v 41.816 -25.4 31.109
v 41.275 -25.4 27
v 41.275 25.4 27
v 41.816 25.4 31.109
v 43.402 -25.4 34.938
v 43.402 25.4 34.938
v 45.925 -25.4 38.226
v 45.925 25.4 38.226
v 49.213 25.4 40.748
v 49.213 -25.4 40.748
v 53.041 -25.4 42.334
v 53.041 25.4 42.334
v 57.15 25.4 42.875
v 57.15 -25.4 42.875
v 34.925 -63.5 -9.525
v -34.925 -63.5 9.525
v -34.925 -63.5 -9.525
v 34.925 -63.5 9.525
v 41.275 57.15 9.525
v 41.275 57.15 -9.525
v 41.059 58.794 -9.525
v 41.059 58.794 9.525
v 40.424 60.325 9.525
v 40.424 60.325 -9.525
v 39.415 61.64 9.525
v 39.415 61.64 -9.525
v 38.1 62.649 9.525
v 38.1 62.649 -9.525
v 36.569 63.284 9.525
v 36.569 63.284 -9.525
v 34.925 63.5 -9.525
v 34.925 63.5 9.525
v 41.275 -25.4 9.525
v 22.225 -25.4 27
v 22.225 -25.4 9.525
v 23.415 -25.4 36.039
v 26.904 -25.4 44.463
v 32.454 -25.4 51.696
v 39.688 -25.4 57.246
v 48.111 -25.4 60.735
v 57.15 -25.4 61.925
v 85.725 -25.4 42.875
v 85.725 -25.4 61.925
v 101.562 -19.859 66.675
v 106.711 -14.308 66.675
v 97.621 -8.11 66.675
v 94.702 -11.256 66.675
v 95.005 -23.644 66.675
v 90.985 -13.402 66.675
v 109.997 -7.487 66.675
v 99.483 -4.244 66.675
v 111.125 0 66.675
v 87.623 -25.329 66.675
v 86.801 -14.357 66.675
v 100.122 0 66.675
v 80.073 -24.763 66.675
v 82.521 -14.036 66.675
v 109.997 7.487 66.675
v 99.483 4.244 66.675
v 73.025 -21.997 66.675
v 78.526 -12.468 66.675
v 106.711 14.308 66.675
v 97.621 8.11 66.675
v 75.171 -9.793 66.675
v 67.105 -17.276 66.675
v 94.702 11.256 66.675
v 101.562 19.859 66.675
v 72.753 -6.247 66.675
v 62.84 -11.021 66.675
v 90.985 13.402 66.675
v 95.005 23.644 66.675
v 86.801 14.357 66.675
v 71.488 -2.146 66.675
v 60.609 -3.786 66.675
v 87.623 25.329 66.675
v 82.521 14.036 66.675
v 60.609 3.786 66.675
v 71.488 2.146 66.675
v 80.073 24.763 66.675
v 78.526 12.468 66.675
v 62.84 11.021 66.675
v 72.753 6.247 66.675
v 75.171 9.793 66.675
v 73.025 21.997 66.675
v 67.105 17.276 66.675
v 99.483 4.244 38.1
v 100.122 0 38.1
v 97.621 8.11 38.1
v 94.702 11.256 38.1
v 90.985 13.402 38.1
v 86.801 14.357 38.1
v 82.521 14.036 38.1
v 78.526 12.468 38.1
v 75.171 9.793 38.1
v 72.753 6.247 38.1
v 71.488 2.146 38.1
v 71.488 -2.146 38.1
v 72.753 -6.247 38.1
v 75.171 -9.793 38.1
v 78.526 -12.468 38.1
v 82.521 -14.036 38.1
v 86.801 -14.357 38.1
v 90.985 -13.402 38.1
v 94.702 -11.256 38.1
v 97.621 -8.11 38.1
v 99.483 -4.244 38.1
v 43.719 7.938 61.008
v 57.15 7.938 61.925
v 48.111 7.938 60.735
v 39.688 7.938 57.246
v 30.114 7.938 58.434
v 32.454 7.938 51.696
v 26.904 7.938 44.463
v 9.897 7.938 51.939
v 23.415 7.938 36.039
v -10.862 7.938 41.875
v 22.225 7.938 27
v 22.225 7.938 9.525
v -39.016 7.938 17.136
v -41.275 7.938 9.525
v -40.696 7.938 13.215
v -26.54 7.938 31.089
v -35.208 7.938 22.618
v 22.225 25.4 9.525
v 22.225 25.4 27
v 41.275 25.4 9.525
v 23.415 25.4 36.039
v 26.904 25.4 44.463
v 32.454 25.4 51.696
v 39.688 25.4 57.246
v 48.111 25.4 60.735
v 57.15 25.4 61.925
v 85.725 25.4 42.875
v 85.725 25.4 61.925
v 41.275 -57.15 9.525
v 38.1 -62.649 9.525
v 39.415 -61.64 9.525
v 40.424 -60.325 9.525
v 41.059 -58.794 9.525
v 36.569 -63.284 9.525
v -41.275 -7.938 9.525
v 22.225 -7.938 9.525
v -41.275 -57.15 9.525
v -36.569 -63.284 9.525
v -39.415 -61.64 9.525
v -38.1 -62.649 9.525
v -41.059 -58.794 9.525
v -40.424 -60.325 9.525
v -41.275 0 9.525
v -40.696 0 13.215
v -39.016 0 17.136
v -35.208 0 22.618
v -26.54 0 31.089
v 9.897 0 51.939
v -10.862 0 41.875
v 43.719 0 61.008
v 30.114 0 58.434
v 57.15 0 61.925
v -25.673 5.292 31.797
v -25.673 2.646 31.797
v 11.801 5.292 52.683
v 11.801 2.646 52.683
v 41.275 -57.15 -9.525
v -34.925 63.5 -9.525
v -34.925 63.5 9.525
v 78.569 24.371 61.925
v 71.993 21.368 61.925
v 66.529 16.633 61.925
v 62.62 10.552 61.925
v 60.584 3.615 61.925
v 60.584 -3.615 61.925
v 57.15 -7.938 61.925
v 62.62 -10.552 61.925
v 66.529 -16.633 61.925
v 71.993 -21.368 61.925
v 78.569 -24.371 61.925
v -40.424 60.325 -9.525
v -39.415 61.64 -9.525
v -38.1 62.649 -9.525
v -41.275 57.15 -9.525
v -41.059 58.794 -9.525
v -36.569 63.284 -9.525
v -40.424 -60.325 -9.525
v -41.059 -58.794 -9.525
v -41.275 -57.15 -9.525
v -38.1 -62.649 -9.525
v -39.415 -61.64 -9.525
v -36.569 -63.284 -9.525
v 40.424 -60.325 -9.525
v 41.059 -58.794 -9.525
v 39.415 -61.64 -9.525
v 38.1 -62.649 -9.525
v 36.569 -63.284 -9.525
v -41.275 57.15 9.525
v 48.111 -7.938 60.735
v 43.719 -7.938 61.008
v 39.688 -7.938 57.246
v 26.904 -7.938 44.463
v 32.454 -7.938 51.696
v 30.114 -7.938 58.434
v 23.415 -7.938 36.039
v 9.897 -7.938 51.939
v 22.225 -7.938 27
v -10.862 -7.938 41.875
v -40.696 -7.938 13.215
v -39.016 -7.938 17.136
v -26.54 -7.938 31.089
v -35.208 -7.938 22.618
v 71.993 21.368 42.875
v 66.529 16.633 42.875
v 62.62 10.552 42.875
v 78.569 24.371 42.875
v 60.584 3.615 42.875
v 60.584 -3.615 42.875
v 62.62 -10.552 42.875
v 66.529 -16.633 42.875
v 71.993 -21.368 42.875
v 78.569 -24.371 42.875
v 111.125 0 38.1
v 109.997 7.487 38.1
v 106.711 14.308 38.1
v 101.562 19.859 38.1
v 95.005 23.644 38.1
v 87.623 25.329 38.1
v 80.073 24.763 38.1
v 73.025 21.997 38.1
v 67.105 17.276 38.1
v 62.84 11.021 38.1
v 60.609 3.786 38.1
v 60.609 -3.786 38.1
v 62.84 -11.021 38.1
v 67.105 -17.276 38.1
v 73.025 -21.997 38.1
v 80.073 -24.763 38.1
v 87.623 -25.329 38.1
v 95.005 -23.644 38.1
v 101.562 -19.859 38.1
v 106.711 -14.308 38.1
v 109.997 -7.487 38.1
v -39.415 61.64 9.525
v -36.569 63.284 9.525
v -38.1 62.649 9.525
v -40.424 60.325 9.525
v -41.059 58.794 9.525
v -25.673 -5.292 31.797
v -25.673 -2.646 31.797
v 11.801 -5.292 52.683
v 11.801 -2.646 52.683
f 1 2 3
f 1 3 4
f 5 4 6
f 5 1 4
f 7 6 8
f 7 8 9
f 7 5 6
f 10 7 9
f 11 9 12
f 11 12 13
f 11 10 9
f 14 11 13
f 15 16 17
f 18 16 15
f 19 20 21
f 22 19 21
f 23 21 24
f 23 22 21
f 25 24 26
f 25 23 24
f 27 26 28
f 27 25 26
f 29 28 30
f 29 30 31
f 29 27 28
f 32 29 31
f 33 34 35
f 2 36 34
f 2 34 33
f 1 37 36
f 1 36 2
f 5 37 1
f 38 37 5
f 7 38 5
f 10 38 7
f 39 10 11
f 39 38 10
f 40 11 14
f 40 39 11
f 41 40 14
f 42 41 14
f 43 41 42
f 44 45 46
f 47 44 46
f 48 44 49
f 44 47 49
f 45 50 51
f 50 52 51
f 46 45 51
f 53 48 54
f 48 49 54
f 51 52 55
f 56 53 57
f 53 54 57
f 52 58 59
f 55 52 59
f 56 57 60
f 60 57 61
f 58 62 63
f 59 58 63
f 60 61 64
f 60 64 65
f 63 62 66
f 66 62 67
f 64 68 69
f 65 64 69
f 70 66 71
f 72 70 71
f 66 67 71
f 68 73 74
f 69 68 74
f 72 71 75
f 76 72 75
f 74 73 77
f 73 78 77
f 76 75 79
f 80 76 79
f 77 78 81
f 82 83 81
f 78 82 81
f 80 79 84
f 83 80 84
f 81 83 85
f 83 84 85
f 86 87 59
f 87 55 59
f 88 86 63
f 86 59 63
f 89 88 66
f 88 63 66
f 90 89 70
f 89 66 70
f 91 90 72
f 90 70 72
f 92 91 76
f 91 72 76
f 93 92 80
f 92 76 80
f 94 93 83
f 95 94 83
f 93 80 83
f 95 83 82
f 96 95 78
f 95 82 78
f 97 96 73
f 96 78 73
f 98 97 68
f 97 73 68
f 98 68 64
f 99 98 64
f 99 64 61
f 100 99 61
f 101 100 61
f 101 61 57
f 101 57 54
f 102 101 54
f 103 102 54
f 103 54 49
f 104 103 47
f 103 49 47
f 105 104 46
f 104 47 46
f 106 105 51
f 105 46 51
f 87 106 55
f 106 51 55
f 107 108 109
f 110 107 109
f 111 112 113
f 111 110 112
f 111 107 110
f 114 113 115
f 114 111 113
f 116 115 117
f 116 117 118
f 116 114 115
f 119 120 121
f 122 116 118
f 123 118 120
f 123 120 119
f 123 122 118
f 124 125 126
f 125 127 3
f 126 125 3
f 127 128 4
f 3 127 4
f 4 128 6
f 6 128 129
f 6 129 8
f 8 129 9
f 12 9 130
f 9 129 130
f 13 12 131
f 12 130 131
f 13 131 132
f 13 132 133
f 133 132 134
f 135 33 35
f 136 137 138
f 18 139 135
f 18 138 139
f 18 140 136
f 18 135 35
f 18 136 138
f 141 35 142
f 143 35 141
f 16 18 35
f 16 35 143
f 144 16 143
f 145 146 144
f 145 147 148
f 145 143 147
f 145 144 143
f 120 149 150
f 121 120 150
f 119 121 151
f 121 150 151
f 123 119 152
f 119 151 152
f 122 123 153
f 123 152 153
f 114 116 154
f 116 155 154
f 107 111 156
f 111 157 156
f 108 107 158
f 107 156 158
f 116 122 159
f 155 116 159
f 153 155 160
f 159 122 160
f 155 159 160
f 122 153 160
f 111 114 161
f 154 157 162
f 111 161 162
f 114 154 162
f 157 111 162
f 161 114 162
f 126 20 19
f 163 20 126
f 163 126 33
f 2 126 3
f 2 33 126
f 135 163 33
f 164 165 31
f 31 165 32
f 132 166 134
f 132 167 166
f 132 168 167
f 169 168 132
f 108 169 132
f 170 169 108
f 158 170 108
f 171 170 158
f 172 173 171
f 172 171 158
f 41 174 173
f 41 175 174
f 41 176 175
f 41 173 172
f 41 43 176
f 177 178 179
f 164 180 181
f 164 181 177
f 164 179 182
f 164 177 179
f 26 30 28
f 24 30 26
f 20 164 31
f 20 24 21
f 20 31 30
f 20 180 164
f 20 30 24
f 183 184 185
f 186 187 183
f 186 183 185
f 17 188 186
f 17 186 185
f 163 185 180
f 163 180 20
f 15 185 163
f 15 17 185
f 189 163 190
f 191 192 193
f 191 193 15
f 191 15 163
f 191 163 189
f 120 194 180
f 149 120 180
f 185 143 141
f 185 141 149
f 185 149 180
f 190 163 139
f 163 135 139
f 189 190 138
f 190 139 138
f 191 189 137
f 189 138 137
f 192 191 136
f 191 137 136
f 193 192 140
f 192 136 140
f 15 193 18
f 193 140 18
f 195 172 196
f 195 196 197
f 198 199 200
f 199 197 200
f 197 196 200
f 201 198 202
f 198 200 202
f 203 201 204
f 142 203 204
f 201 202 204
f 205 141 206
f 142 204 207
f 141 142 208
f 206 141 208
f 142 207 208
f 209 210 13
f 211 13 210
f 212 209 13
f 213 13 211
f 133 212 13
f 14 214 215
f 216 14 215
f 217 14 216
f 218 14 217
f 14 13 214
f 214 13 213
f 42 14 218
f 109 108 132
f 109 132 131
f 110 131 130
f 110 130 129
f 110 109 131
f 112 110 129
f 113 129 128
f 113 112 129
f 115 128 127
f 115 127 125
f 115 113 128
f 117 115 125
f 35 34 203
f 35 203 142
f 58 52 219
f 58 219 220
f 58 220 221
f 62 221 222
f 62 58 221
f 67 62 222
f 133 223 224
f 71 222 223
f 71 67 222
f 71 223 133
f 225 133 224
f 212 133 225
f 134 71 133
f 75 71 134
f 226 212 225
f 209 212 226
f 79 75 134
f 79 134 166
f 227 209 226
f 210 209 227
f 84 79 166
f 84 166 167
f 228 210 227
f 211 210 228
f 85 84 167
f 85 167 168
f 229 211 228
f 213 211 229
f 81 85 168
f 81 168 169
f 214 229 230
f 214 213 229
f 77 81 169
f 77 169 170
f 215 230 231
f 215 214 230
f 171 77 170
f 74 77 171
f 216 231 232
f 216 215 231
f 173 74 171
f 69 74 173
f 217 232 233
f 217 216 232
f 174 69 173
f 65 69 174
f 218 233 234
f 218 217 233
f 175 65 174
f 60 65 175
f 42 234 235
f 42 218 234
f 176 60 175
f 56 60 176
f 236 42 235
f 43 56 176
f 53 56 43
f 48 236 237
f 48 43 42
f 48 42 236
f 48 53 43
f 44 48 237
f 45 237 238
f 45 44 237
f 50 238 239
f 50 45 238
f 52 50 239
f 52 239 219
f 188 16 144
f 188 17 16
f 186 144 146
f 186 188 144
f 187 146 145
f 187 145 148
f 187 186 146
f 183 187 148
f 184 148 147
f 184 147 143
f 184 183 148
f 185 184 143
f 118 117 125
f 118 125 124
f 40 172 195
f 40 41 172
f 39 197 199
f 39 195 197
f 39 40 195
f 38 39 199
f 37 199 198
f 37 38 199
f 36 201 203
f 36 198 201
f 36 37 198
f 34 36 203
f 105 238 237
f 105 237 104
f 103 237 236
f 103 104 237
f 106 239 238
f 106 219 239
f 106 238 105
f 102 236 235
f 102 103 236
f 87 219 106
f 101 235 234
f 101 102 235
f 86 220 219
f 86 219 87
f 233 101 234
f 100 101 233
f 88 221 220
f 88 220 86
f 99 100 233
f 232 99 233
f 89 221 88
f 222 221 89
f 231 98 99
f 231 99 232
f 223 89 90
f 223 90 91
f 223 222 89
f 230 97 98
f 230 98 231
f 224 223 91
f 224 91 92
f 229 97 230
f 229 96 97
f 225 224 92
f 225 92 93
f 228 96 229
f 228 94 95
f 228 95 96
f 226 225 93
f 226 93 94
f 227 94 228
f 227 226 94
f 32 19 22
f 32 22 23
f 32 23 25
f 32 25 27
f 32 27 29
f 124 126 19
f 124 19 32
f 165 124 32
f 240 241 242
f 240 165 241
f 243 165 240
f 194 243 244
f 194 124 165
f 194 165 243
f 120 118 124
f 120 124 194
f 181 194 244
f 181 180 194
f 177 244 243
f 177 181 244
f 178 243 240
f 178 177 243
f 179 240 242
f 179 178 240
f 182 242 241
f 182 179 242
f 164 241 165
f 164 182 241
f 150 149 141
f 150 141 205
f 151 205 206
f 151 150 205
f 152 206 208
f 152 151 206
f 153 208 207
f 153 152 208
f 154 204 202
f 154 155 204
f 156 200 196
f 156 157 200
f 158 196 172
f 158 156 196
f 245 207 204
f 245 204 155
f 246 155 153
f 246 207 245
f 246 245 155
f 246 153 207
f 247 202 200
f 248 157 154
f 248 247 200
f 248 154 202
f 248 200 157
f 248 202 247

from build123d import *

# Parameters (mm, degrees)
F1_DEPTH = 63.5
F0_W     = 25.4
F0_H     = 19.05
F2_DEPTH = 25.4
F3_DEPTH = 7.9375
F0_W_2   = 11.0026748776
F0_H_2   = 28.575
F5_R     = 6.35


with BuildPart() as f1:
    # F0 (on Front) → F1 (new body, symmetric)
    with BuildSketch(Plane.XZ):
        Polygon((22.225, 9.525), (-41.275, 9.525), (-41.275, -9.525), (41.275, -9.525), (41.275, 9.525), align=None)
    extrude(amount=F1_DEPTH, both=True)

    # F0 (on Front) → F2 (join, symmetric)
    with BuildSketch(Plane.XZ):
        with BuildLine():
            Line((22.225, 27.0002), (22.225, 9.525))
            Line((22.225, 9.525), (41.275, 9.525))
            Line((41.275, 9.525), (41.275, 27.0002))
            ThreePointArc((41.275, 27.0002), (45.9246798487, 38.2255201513), (57.15, 42.8752))
            Line((57.15, 42.8752), (60.325, 42.8752))
            Line((60.325, 42.8752), (60.325, 61.9252))
            Line((60.325, 61.9252), (57.15, 61.9252))
            ThreePointArc((57.15, 61.9252), (32.4542956671, 51.6959043329), (22.225, 27.0002))
        make_face()
        with Locations((73.025, 52.4002)):
            Rectangle(F0_W, F0_H)
    extrude(amount=F2_DEPTH, both=True)

    # F0 (on Front) → F3 (join, symmetric)
    with BuildSketch(Plane.XZ):
        with BuildLine():
            add(Edge.make_bspline(
                [(-41.275, 9.525), (-41.275, 29.0701329026), (12.5299637369, 61.9252), (57.15, 61.9252)],
                knots=[0, 0, 0, 0, 111.5045361635, 111.5045361635, 111.5045361635, 111.5045361635], degree=3))
            Line((-41.275, 9.525), (22.225, 9.525))
            Line((22.225, 9.525), (22.225, 27.0002))
            ThreePointArc((22.225, 27.0002), (32.4542956671, 51.6959043329), (57.15, 61.9252))
        make_face()
    extrude(amount=F3_DEPTH, both=True)

    # F0 (on Front) → F4 (revolve)
    with BuildSketch(Plane.XZ):
        with Locations((105.6236625612, 52.3875)):
            Rectangle(F0_W_2, F0_H_2)
    revolve(axis=Axis((85.725, 0, 52.3875), (0, 0, 1)))

    # F5
    f5_edges = [f1.edges().sort_by_distance(p)[0] for p in [
        (-41.275, -63.5, 0),
        (41.275, -63.5, 0),
        (41.275, 63.5, 0),
        (-41.275, 63.5, 0),
    ]]
    fillet(f5_edges, radius=F5_R)

    # F0 (on Front) → F6 (revolve, cut)
    with BuildSketch(Plane.XZ):
        Polygon((85.725, 66.675), (85.725, 61.9252), (85.725, 42.8752), (85.725, 38.1), (100.1223251224, 38.1), (100.1223251224, 66.675), align=None)
    revolve(axis=Axis((85.725, 0, 52.3875), (0, 0, 1)), mode=Mode.SUBTRACT)


solid = f1.part
